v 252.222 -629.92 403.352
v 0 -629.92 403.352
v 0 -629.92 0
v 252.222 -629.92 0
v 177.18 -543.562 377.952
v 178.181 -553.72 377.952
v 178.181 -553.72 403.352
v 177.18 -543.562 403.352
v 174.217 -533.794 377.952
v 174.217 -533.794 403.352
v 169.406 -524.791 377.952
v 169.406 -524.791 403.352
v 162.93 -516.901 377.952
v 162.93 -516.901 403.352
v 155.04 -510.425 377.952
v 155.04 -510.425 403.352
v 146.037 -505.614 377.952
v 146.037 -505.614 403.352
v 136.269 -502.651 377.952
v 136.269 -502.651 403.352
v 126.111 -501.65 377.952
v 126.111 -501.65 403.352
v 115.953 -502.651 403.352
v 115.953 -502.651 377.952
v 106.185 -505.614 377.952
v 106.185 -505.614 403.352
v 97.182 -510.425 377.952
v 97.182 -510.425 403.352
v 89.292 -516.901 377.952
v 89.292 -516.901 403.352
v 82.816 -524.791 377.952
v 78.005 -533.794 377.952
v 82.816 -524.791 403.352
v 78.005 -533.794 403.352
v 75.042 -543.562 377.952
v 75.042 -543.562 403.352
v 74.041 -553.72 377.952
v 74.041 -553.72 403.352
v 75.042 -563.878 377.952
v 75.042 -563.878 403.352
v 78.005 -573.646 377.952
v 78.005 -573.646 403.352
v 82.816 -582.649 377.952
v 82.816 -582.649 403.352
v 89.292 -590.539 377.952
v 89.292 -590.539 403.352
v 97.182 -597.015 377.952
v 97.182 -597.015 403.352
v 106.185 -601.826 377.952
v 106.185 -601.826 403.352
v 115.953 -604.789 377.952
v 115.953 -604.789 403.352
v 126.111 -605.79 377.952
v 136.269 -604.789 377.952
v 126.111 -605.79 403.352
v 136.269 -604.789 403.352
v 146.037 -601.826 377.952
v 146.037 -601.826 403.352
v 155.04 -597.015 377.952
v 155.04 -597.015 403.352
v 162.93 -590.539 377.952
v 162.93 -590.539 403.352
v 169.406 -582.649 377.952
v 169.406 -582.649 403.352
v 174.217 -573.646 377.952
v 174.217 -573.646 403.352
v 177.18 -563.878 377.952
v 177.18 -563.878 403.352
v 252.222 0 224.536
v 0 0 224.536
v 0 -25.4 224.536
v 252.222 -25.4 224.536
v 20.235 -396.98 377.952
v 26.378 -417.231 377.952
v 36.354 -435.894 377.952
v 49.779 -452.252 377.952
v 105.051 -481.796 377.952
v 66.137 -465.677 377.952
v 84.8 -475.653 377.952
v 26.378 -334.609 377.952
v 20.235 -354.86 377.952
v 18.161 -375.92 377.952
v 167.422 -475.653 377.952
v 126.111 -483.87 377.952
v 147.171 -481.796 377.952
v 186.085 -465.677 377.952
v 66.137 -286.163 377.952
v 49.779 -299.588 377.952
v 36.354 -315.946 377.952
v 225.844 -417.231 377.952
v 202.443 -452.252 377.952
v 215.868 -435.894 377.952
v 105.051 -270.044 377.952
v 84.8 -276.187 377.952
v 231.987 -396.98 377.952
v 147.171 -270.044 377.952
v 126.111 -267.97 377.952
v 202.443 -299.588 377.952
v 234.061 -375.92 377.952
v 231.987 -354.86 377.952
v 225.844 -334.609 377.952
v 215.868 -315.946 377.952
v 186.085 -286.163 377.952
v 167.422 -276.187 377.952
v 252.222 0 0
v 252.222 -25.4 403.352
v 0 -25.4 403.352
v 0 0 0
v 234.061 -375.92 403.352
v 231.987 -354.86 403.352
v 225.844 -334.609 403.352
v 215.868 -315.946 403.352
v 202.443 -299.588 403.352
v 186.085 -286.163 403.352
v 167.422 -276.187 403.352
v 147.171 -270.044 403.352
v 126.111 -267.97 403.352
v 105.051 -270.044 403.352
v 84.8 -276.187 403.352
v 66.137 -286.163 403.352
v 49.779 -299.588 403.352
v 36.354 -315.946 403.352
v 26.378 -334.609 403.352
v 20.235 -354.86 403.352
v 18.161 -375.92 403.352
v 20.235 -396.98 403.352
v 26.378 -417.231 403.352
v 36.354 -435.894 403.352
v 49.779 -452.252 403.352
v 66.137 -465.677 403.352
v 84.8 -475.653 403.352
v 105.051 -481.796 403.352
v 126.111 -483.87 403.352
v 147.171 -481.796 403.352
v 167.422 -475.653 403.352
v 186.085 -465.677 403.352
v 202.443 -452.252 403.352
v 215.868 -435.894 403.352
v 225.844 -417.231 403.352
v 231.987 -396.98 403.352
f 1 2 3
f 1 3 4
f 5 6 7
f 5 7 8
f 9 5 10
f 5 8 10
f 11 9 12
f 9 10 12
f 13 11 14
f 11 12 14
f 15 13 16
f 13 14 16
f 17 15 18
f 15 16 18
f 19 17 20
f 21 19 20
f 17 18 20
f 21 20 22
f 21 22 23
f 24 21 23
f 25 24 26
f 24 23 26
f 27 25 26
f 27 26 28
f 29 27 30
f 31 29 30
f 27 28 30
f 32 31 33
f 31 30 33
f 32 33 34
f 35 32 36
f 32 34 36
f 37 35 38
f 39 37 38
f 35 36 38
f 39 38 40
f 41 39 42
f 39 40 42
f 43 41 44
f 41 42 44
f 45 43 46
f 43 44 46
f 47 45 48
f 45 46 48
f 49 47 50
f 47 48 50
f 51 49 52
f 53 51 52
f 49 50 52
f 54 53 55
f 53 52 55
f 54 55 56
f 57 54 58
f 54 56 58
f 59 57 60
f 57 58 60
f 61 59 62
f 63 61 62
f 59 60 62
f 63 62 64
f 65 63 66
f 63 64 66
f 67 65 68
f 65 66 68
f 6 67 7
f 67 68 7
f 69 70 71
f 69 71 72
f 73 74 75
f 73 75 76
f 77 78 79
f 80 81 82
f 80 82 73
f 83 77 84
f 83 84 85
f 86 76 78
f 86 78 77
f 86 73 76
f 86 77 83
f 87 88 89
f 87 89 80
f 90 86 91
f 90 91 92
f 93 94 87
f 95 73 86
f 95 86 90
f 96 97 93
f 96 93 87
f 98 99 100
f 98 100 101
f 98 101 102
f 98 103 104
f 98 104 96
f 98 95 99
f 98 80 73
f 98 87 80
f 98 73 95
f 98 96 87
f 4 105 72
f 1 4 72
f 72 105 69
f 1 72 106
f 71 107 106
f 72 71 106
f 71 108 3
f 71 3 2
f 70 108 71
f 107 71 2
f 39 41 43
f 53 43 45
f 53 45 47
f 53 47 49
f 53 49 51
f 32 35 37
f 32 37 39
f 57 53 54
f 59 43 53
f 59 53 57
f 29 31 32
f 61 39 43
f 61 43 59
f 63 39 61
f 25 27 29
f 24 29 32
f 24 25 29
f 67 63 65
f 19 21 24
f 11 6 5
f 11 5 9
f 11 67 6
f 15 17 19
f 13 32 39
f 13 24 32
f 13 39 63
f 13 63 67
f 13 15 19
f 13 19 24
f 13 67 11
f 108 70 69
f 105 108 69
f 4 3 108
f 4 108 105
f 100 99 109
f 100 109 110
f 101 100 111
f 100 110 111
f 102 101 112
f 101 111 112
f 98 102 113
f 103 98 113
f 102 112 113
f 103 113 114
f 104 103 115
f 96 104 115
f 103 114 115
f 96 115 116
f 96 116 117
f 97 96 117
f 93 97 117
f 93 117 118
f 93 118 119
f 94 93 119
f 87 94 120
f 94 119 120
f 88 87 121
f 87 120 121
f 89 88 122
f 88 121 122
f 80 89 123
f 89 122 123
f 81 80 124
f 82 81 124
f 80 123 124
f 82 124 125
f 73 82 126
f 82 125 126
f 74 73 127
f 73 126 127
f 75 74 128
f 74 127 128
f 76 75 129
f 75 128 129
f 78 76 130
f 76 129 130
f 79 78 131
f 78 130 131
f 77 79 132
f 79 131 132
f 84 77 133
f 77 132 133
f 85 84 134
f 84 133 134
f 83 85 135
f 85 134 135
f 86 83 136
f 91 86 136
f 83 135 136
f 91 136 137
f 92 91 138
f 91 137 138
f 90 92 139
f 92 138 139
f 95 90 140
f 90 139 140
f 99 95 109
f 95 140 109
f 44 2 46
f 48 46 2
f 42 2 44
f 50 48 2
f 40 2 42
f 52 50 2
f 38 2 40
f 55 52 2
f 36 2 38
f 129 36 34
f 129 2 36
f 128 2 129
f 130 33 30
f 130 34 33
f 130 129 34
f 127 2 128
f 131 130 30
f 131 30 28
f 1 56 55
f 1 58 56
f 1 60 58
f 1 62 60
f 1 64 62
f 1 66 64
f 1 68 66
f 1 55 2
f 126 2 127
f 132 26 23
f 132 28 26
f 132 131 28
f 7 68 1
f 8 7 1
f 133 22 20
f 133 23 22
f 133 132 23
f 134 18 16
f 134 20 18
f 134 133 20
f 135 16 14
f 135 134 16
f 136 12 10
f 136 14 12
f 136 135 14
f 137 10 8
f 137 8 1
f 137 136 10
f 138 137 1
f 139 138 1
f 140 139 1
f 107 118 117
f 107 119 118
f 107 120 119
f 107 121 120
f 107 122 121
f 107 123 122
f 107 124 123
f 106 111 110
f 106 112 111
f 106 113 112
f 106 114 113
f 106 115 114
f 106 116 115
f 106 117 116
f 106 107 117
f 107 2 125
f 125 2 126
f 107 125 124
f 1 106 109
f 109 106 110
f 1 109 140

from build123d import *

# Parameters (mm, degrees)
F0_W     = 252.222
F0_H     = 403.352
F1_DEPTH = 629.92
F2_R     = 52.07
F2_R_2   = 107.95
F3_DEPTH = 25.4
F5_W     = 252.222
F5_H     = 25.4
F6_DEPTH = 178.816


with BuildPart() as f1:
    # F0 (on Front) → F1 (new body)
    with BuildSketch(Plane.XZ):
        with Locations((126.111, 201.676)):
            Rectangle(F0_W, F0_H)
    extrude(amount=F1_DEPTH)

    # F2 (on face) → F3 (cut)
    with BuildSketch(Plane.XY.offset(403.352)):
        with Locations((126.111, -553.72)):
            Circle(F2_R)
        with Locations((126.111, -375.92)):
            Circle(F2_R_2)
    extrude(amount=-F3_DEPTH, mode=Mode.SUBTRACT)

    # F5 (on face) → F6 (cut)
    with BuildSketch(Plane.XY.offset(403.352)):
        with Locations((126.111, -12.7)):
            Rectangle(F5_W, F5_H)
    extrude(amount=-F6_DEPTH, mode=Mode.SUBTRACT)


solid = f1.part
